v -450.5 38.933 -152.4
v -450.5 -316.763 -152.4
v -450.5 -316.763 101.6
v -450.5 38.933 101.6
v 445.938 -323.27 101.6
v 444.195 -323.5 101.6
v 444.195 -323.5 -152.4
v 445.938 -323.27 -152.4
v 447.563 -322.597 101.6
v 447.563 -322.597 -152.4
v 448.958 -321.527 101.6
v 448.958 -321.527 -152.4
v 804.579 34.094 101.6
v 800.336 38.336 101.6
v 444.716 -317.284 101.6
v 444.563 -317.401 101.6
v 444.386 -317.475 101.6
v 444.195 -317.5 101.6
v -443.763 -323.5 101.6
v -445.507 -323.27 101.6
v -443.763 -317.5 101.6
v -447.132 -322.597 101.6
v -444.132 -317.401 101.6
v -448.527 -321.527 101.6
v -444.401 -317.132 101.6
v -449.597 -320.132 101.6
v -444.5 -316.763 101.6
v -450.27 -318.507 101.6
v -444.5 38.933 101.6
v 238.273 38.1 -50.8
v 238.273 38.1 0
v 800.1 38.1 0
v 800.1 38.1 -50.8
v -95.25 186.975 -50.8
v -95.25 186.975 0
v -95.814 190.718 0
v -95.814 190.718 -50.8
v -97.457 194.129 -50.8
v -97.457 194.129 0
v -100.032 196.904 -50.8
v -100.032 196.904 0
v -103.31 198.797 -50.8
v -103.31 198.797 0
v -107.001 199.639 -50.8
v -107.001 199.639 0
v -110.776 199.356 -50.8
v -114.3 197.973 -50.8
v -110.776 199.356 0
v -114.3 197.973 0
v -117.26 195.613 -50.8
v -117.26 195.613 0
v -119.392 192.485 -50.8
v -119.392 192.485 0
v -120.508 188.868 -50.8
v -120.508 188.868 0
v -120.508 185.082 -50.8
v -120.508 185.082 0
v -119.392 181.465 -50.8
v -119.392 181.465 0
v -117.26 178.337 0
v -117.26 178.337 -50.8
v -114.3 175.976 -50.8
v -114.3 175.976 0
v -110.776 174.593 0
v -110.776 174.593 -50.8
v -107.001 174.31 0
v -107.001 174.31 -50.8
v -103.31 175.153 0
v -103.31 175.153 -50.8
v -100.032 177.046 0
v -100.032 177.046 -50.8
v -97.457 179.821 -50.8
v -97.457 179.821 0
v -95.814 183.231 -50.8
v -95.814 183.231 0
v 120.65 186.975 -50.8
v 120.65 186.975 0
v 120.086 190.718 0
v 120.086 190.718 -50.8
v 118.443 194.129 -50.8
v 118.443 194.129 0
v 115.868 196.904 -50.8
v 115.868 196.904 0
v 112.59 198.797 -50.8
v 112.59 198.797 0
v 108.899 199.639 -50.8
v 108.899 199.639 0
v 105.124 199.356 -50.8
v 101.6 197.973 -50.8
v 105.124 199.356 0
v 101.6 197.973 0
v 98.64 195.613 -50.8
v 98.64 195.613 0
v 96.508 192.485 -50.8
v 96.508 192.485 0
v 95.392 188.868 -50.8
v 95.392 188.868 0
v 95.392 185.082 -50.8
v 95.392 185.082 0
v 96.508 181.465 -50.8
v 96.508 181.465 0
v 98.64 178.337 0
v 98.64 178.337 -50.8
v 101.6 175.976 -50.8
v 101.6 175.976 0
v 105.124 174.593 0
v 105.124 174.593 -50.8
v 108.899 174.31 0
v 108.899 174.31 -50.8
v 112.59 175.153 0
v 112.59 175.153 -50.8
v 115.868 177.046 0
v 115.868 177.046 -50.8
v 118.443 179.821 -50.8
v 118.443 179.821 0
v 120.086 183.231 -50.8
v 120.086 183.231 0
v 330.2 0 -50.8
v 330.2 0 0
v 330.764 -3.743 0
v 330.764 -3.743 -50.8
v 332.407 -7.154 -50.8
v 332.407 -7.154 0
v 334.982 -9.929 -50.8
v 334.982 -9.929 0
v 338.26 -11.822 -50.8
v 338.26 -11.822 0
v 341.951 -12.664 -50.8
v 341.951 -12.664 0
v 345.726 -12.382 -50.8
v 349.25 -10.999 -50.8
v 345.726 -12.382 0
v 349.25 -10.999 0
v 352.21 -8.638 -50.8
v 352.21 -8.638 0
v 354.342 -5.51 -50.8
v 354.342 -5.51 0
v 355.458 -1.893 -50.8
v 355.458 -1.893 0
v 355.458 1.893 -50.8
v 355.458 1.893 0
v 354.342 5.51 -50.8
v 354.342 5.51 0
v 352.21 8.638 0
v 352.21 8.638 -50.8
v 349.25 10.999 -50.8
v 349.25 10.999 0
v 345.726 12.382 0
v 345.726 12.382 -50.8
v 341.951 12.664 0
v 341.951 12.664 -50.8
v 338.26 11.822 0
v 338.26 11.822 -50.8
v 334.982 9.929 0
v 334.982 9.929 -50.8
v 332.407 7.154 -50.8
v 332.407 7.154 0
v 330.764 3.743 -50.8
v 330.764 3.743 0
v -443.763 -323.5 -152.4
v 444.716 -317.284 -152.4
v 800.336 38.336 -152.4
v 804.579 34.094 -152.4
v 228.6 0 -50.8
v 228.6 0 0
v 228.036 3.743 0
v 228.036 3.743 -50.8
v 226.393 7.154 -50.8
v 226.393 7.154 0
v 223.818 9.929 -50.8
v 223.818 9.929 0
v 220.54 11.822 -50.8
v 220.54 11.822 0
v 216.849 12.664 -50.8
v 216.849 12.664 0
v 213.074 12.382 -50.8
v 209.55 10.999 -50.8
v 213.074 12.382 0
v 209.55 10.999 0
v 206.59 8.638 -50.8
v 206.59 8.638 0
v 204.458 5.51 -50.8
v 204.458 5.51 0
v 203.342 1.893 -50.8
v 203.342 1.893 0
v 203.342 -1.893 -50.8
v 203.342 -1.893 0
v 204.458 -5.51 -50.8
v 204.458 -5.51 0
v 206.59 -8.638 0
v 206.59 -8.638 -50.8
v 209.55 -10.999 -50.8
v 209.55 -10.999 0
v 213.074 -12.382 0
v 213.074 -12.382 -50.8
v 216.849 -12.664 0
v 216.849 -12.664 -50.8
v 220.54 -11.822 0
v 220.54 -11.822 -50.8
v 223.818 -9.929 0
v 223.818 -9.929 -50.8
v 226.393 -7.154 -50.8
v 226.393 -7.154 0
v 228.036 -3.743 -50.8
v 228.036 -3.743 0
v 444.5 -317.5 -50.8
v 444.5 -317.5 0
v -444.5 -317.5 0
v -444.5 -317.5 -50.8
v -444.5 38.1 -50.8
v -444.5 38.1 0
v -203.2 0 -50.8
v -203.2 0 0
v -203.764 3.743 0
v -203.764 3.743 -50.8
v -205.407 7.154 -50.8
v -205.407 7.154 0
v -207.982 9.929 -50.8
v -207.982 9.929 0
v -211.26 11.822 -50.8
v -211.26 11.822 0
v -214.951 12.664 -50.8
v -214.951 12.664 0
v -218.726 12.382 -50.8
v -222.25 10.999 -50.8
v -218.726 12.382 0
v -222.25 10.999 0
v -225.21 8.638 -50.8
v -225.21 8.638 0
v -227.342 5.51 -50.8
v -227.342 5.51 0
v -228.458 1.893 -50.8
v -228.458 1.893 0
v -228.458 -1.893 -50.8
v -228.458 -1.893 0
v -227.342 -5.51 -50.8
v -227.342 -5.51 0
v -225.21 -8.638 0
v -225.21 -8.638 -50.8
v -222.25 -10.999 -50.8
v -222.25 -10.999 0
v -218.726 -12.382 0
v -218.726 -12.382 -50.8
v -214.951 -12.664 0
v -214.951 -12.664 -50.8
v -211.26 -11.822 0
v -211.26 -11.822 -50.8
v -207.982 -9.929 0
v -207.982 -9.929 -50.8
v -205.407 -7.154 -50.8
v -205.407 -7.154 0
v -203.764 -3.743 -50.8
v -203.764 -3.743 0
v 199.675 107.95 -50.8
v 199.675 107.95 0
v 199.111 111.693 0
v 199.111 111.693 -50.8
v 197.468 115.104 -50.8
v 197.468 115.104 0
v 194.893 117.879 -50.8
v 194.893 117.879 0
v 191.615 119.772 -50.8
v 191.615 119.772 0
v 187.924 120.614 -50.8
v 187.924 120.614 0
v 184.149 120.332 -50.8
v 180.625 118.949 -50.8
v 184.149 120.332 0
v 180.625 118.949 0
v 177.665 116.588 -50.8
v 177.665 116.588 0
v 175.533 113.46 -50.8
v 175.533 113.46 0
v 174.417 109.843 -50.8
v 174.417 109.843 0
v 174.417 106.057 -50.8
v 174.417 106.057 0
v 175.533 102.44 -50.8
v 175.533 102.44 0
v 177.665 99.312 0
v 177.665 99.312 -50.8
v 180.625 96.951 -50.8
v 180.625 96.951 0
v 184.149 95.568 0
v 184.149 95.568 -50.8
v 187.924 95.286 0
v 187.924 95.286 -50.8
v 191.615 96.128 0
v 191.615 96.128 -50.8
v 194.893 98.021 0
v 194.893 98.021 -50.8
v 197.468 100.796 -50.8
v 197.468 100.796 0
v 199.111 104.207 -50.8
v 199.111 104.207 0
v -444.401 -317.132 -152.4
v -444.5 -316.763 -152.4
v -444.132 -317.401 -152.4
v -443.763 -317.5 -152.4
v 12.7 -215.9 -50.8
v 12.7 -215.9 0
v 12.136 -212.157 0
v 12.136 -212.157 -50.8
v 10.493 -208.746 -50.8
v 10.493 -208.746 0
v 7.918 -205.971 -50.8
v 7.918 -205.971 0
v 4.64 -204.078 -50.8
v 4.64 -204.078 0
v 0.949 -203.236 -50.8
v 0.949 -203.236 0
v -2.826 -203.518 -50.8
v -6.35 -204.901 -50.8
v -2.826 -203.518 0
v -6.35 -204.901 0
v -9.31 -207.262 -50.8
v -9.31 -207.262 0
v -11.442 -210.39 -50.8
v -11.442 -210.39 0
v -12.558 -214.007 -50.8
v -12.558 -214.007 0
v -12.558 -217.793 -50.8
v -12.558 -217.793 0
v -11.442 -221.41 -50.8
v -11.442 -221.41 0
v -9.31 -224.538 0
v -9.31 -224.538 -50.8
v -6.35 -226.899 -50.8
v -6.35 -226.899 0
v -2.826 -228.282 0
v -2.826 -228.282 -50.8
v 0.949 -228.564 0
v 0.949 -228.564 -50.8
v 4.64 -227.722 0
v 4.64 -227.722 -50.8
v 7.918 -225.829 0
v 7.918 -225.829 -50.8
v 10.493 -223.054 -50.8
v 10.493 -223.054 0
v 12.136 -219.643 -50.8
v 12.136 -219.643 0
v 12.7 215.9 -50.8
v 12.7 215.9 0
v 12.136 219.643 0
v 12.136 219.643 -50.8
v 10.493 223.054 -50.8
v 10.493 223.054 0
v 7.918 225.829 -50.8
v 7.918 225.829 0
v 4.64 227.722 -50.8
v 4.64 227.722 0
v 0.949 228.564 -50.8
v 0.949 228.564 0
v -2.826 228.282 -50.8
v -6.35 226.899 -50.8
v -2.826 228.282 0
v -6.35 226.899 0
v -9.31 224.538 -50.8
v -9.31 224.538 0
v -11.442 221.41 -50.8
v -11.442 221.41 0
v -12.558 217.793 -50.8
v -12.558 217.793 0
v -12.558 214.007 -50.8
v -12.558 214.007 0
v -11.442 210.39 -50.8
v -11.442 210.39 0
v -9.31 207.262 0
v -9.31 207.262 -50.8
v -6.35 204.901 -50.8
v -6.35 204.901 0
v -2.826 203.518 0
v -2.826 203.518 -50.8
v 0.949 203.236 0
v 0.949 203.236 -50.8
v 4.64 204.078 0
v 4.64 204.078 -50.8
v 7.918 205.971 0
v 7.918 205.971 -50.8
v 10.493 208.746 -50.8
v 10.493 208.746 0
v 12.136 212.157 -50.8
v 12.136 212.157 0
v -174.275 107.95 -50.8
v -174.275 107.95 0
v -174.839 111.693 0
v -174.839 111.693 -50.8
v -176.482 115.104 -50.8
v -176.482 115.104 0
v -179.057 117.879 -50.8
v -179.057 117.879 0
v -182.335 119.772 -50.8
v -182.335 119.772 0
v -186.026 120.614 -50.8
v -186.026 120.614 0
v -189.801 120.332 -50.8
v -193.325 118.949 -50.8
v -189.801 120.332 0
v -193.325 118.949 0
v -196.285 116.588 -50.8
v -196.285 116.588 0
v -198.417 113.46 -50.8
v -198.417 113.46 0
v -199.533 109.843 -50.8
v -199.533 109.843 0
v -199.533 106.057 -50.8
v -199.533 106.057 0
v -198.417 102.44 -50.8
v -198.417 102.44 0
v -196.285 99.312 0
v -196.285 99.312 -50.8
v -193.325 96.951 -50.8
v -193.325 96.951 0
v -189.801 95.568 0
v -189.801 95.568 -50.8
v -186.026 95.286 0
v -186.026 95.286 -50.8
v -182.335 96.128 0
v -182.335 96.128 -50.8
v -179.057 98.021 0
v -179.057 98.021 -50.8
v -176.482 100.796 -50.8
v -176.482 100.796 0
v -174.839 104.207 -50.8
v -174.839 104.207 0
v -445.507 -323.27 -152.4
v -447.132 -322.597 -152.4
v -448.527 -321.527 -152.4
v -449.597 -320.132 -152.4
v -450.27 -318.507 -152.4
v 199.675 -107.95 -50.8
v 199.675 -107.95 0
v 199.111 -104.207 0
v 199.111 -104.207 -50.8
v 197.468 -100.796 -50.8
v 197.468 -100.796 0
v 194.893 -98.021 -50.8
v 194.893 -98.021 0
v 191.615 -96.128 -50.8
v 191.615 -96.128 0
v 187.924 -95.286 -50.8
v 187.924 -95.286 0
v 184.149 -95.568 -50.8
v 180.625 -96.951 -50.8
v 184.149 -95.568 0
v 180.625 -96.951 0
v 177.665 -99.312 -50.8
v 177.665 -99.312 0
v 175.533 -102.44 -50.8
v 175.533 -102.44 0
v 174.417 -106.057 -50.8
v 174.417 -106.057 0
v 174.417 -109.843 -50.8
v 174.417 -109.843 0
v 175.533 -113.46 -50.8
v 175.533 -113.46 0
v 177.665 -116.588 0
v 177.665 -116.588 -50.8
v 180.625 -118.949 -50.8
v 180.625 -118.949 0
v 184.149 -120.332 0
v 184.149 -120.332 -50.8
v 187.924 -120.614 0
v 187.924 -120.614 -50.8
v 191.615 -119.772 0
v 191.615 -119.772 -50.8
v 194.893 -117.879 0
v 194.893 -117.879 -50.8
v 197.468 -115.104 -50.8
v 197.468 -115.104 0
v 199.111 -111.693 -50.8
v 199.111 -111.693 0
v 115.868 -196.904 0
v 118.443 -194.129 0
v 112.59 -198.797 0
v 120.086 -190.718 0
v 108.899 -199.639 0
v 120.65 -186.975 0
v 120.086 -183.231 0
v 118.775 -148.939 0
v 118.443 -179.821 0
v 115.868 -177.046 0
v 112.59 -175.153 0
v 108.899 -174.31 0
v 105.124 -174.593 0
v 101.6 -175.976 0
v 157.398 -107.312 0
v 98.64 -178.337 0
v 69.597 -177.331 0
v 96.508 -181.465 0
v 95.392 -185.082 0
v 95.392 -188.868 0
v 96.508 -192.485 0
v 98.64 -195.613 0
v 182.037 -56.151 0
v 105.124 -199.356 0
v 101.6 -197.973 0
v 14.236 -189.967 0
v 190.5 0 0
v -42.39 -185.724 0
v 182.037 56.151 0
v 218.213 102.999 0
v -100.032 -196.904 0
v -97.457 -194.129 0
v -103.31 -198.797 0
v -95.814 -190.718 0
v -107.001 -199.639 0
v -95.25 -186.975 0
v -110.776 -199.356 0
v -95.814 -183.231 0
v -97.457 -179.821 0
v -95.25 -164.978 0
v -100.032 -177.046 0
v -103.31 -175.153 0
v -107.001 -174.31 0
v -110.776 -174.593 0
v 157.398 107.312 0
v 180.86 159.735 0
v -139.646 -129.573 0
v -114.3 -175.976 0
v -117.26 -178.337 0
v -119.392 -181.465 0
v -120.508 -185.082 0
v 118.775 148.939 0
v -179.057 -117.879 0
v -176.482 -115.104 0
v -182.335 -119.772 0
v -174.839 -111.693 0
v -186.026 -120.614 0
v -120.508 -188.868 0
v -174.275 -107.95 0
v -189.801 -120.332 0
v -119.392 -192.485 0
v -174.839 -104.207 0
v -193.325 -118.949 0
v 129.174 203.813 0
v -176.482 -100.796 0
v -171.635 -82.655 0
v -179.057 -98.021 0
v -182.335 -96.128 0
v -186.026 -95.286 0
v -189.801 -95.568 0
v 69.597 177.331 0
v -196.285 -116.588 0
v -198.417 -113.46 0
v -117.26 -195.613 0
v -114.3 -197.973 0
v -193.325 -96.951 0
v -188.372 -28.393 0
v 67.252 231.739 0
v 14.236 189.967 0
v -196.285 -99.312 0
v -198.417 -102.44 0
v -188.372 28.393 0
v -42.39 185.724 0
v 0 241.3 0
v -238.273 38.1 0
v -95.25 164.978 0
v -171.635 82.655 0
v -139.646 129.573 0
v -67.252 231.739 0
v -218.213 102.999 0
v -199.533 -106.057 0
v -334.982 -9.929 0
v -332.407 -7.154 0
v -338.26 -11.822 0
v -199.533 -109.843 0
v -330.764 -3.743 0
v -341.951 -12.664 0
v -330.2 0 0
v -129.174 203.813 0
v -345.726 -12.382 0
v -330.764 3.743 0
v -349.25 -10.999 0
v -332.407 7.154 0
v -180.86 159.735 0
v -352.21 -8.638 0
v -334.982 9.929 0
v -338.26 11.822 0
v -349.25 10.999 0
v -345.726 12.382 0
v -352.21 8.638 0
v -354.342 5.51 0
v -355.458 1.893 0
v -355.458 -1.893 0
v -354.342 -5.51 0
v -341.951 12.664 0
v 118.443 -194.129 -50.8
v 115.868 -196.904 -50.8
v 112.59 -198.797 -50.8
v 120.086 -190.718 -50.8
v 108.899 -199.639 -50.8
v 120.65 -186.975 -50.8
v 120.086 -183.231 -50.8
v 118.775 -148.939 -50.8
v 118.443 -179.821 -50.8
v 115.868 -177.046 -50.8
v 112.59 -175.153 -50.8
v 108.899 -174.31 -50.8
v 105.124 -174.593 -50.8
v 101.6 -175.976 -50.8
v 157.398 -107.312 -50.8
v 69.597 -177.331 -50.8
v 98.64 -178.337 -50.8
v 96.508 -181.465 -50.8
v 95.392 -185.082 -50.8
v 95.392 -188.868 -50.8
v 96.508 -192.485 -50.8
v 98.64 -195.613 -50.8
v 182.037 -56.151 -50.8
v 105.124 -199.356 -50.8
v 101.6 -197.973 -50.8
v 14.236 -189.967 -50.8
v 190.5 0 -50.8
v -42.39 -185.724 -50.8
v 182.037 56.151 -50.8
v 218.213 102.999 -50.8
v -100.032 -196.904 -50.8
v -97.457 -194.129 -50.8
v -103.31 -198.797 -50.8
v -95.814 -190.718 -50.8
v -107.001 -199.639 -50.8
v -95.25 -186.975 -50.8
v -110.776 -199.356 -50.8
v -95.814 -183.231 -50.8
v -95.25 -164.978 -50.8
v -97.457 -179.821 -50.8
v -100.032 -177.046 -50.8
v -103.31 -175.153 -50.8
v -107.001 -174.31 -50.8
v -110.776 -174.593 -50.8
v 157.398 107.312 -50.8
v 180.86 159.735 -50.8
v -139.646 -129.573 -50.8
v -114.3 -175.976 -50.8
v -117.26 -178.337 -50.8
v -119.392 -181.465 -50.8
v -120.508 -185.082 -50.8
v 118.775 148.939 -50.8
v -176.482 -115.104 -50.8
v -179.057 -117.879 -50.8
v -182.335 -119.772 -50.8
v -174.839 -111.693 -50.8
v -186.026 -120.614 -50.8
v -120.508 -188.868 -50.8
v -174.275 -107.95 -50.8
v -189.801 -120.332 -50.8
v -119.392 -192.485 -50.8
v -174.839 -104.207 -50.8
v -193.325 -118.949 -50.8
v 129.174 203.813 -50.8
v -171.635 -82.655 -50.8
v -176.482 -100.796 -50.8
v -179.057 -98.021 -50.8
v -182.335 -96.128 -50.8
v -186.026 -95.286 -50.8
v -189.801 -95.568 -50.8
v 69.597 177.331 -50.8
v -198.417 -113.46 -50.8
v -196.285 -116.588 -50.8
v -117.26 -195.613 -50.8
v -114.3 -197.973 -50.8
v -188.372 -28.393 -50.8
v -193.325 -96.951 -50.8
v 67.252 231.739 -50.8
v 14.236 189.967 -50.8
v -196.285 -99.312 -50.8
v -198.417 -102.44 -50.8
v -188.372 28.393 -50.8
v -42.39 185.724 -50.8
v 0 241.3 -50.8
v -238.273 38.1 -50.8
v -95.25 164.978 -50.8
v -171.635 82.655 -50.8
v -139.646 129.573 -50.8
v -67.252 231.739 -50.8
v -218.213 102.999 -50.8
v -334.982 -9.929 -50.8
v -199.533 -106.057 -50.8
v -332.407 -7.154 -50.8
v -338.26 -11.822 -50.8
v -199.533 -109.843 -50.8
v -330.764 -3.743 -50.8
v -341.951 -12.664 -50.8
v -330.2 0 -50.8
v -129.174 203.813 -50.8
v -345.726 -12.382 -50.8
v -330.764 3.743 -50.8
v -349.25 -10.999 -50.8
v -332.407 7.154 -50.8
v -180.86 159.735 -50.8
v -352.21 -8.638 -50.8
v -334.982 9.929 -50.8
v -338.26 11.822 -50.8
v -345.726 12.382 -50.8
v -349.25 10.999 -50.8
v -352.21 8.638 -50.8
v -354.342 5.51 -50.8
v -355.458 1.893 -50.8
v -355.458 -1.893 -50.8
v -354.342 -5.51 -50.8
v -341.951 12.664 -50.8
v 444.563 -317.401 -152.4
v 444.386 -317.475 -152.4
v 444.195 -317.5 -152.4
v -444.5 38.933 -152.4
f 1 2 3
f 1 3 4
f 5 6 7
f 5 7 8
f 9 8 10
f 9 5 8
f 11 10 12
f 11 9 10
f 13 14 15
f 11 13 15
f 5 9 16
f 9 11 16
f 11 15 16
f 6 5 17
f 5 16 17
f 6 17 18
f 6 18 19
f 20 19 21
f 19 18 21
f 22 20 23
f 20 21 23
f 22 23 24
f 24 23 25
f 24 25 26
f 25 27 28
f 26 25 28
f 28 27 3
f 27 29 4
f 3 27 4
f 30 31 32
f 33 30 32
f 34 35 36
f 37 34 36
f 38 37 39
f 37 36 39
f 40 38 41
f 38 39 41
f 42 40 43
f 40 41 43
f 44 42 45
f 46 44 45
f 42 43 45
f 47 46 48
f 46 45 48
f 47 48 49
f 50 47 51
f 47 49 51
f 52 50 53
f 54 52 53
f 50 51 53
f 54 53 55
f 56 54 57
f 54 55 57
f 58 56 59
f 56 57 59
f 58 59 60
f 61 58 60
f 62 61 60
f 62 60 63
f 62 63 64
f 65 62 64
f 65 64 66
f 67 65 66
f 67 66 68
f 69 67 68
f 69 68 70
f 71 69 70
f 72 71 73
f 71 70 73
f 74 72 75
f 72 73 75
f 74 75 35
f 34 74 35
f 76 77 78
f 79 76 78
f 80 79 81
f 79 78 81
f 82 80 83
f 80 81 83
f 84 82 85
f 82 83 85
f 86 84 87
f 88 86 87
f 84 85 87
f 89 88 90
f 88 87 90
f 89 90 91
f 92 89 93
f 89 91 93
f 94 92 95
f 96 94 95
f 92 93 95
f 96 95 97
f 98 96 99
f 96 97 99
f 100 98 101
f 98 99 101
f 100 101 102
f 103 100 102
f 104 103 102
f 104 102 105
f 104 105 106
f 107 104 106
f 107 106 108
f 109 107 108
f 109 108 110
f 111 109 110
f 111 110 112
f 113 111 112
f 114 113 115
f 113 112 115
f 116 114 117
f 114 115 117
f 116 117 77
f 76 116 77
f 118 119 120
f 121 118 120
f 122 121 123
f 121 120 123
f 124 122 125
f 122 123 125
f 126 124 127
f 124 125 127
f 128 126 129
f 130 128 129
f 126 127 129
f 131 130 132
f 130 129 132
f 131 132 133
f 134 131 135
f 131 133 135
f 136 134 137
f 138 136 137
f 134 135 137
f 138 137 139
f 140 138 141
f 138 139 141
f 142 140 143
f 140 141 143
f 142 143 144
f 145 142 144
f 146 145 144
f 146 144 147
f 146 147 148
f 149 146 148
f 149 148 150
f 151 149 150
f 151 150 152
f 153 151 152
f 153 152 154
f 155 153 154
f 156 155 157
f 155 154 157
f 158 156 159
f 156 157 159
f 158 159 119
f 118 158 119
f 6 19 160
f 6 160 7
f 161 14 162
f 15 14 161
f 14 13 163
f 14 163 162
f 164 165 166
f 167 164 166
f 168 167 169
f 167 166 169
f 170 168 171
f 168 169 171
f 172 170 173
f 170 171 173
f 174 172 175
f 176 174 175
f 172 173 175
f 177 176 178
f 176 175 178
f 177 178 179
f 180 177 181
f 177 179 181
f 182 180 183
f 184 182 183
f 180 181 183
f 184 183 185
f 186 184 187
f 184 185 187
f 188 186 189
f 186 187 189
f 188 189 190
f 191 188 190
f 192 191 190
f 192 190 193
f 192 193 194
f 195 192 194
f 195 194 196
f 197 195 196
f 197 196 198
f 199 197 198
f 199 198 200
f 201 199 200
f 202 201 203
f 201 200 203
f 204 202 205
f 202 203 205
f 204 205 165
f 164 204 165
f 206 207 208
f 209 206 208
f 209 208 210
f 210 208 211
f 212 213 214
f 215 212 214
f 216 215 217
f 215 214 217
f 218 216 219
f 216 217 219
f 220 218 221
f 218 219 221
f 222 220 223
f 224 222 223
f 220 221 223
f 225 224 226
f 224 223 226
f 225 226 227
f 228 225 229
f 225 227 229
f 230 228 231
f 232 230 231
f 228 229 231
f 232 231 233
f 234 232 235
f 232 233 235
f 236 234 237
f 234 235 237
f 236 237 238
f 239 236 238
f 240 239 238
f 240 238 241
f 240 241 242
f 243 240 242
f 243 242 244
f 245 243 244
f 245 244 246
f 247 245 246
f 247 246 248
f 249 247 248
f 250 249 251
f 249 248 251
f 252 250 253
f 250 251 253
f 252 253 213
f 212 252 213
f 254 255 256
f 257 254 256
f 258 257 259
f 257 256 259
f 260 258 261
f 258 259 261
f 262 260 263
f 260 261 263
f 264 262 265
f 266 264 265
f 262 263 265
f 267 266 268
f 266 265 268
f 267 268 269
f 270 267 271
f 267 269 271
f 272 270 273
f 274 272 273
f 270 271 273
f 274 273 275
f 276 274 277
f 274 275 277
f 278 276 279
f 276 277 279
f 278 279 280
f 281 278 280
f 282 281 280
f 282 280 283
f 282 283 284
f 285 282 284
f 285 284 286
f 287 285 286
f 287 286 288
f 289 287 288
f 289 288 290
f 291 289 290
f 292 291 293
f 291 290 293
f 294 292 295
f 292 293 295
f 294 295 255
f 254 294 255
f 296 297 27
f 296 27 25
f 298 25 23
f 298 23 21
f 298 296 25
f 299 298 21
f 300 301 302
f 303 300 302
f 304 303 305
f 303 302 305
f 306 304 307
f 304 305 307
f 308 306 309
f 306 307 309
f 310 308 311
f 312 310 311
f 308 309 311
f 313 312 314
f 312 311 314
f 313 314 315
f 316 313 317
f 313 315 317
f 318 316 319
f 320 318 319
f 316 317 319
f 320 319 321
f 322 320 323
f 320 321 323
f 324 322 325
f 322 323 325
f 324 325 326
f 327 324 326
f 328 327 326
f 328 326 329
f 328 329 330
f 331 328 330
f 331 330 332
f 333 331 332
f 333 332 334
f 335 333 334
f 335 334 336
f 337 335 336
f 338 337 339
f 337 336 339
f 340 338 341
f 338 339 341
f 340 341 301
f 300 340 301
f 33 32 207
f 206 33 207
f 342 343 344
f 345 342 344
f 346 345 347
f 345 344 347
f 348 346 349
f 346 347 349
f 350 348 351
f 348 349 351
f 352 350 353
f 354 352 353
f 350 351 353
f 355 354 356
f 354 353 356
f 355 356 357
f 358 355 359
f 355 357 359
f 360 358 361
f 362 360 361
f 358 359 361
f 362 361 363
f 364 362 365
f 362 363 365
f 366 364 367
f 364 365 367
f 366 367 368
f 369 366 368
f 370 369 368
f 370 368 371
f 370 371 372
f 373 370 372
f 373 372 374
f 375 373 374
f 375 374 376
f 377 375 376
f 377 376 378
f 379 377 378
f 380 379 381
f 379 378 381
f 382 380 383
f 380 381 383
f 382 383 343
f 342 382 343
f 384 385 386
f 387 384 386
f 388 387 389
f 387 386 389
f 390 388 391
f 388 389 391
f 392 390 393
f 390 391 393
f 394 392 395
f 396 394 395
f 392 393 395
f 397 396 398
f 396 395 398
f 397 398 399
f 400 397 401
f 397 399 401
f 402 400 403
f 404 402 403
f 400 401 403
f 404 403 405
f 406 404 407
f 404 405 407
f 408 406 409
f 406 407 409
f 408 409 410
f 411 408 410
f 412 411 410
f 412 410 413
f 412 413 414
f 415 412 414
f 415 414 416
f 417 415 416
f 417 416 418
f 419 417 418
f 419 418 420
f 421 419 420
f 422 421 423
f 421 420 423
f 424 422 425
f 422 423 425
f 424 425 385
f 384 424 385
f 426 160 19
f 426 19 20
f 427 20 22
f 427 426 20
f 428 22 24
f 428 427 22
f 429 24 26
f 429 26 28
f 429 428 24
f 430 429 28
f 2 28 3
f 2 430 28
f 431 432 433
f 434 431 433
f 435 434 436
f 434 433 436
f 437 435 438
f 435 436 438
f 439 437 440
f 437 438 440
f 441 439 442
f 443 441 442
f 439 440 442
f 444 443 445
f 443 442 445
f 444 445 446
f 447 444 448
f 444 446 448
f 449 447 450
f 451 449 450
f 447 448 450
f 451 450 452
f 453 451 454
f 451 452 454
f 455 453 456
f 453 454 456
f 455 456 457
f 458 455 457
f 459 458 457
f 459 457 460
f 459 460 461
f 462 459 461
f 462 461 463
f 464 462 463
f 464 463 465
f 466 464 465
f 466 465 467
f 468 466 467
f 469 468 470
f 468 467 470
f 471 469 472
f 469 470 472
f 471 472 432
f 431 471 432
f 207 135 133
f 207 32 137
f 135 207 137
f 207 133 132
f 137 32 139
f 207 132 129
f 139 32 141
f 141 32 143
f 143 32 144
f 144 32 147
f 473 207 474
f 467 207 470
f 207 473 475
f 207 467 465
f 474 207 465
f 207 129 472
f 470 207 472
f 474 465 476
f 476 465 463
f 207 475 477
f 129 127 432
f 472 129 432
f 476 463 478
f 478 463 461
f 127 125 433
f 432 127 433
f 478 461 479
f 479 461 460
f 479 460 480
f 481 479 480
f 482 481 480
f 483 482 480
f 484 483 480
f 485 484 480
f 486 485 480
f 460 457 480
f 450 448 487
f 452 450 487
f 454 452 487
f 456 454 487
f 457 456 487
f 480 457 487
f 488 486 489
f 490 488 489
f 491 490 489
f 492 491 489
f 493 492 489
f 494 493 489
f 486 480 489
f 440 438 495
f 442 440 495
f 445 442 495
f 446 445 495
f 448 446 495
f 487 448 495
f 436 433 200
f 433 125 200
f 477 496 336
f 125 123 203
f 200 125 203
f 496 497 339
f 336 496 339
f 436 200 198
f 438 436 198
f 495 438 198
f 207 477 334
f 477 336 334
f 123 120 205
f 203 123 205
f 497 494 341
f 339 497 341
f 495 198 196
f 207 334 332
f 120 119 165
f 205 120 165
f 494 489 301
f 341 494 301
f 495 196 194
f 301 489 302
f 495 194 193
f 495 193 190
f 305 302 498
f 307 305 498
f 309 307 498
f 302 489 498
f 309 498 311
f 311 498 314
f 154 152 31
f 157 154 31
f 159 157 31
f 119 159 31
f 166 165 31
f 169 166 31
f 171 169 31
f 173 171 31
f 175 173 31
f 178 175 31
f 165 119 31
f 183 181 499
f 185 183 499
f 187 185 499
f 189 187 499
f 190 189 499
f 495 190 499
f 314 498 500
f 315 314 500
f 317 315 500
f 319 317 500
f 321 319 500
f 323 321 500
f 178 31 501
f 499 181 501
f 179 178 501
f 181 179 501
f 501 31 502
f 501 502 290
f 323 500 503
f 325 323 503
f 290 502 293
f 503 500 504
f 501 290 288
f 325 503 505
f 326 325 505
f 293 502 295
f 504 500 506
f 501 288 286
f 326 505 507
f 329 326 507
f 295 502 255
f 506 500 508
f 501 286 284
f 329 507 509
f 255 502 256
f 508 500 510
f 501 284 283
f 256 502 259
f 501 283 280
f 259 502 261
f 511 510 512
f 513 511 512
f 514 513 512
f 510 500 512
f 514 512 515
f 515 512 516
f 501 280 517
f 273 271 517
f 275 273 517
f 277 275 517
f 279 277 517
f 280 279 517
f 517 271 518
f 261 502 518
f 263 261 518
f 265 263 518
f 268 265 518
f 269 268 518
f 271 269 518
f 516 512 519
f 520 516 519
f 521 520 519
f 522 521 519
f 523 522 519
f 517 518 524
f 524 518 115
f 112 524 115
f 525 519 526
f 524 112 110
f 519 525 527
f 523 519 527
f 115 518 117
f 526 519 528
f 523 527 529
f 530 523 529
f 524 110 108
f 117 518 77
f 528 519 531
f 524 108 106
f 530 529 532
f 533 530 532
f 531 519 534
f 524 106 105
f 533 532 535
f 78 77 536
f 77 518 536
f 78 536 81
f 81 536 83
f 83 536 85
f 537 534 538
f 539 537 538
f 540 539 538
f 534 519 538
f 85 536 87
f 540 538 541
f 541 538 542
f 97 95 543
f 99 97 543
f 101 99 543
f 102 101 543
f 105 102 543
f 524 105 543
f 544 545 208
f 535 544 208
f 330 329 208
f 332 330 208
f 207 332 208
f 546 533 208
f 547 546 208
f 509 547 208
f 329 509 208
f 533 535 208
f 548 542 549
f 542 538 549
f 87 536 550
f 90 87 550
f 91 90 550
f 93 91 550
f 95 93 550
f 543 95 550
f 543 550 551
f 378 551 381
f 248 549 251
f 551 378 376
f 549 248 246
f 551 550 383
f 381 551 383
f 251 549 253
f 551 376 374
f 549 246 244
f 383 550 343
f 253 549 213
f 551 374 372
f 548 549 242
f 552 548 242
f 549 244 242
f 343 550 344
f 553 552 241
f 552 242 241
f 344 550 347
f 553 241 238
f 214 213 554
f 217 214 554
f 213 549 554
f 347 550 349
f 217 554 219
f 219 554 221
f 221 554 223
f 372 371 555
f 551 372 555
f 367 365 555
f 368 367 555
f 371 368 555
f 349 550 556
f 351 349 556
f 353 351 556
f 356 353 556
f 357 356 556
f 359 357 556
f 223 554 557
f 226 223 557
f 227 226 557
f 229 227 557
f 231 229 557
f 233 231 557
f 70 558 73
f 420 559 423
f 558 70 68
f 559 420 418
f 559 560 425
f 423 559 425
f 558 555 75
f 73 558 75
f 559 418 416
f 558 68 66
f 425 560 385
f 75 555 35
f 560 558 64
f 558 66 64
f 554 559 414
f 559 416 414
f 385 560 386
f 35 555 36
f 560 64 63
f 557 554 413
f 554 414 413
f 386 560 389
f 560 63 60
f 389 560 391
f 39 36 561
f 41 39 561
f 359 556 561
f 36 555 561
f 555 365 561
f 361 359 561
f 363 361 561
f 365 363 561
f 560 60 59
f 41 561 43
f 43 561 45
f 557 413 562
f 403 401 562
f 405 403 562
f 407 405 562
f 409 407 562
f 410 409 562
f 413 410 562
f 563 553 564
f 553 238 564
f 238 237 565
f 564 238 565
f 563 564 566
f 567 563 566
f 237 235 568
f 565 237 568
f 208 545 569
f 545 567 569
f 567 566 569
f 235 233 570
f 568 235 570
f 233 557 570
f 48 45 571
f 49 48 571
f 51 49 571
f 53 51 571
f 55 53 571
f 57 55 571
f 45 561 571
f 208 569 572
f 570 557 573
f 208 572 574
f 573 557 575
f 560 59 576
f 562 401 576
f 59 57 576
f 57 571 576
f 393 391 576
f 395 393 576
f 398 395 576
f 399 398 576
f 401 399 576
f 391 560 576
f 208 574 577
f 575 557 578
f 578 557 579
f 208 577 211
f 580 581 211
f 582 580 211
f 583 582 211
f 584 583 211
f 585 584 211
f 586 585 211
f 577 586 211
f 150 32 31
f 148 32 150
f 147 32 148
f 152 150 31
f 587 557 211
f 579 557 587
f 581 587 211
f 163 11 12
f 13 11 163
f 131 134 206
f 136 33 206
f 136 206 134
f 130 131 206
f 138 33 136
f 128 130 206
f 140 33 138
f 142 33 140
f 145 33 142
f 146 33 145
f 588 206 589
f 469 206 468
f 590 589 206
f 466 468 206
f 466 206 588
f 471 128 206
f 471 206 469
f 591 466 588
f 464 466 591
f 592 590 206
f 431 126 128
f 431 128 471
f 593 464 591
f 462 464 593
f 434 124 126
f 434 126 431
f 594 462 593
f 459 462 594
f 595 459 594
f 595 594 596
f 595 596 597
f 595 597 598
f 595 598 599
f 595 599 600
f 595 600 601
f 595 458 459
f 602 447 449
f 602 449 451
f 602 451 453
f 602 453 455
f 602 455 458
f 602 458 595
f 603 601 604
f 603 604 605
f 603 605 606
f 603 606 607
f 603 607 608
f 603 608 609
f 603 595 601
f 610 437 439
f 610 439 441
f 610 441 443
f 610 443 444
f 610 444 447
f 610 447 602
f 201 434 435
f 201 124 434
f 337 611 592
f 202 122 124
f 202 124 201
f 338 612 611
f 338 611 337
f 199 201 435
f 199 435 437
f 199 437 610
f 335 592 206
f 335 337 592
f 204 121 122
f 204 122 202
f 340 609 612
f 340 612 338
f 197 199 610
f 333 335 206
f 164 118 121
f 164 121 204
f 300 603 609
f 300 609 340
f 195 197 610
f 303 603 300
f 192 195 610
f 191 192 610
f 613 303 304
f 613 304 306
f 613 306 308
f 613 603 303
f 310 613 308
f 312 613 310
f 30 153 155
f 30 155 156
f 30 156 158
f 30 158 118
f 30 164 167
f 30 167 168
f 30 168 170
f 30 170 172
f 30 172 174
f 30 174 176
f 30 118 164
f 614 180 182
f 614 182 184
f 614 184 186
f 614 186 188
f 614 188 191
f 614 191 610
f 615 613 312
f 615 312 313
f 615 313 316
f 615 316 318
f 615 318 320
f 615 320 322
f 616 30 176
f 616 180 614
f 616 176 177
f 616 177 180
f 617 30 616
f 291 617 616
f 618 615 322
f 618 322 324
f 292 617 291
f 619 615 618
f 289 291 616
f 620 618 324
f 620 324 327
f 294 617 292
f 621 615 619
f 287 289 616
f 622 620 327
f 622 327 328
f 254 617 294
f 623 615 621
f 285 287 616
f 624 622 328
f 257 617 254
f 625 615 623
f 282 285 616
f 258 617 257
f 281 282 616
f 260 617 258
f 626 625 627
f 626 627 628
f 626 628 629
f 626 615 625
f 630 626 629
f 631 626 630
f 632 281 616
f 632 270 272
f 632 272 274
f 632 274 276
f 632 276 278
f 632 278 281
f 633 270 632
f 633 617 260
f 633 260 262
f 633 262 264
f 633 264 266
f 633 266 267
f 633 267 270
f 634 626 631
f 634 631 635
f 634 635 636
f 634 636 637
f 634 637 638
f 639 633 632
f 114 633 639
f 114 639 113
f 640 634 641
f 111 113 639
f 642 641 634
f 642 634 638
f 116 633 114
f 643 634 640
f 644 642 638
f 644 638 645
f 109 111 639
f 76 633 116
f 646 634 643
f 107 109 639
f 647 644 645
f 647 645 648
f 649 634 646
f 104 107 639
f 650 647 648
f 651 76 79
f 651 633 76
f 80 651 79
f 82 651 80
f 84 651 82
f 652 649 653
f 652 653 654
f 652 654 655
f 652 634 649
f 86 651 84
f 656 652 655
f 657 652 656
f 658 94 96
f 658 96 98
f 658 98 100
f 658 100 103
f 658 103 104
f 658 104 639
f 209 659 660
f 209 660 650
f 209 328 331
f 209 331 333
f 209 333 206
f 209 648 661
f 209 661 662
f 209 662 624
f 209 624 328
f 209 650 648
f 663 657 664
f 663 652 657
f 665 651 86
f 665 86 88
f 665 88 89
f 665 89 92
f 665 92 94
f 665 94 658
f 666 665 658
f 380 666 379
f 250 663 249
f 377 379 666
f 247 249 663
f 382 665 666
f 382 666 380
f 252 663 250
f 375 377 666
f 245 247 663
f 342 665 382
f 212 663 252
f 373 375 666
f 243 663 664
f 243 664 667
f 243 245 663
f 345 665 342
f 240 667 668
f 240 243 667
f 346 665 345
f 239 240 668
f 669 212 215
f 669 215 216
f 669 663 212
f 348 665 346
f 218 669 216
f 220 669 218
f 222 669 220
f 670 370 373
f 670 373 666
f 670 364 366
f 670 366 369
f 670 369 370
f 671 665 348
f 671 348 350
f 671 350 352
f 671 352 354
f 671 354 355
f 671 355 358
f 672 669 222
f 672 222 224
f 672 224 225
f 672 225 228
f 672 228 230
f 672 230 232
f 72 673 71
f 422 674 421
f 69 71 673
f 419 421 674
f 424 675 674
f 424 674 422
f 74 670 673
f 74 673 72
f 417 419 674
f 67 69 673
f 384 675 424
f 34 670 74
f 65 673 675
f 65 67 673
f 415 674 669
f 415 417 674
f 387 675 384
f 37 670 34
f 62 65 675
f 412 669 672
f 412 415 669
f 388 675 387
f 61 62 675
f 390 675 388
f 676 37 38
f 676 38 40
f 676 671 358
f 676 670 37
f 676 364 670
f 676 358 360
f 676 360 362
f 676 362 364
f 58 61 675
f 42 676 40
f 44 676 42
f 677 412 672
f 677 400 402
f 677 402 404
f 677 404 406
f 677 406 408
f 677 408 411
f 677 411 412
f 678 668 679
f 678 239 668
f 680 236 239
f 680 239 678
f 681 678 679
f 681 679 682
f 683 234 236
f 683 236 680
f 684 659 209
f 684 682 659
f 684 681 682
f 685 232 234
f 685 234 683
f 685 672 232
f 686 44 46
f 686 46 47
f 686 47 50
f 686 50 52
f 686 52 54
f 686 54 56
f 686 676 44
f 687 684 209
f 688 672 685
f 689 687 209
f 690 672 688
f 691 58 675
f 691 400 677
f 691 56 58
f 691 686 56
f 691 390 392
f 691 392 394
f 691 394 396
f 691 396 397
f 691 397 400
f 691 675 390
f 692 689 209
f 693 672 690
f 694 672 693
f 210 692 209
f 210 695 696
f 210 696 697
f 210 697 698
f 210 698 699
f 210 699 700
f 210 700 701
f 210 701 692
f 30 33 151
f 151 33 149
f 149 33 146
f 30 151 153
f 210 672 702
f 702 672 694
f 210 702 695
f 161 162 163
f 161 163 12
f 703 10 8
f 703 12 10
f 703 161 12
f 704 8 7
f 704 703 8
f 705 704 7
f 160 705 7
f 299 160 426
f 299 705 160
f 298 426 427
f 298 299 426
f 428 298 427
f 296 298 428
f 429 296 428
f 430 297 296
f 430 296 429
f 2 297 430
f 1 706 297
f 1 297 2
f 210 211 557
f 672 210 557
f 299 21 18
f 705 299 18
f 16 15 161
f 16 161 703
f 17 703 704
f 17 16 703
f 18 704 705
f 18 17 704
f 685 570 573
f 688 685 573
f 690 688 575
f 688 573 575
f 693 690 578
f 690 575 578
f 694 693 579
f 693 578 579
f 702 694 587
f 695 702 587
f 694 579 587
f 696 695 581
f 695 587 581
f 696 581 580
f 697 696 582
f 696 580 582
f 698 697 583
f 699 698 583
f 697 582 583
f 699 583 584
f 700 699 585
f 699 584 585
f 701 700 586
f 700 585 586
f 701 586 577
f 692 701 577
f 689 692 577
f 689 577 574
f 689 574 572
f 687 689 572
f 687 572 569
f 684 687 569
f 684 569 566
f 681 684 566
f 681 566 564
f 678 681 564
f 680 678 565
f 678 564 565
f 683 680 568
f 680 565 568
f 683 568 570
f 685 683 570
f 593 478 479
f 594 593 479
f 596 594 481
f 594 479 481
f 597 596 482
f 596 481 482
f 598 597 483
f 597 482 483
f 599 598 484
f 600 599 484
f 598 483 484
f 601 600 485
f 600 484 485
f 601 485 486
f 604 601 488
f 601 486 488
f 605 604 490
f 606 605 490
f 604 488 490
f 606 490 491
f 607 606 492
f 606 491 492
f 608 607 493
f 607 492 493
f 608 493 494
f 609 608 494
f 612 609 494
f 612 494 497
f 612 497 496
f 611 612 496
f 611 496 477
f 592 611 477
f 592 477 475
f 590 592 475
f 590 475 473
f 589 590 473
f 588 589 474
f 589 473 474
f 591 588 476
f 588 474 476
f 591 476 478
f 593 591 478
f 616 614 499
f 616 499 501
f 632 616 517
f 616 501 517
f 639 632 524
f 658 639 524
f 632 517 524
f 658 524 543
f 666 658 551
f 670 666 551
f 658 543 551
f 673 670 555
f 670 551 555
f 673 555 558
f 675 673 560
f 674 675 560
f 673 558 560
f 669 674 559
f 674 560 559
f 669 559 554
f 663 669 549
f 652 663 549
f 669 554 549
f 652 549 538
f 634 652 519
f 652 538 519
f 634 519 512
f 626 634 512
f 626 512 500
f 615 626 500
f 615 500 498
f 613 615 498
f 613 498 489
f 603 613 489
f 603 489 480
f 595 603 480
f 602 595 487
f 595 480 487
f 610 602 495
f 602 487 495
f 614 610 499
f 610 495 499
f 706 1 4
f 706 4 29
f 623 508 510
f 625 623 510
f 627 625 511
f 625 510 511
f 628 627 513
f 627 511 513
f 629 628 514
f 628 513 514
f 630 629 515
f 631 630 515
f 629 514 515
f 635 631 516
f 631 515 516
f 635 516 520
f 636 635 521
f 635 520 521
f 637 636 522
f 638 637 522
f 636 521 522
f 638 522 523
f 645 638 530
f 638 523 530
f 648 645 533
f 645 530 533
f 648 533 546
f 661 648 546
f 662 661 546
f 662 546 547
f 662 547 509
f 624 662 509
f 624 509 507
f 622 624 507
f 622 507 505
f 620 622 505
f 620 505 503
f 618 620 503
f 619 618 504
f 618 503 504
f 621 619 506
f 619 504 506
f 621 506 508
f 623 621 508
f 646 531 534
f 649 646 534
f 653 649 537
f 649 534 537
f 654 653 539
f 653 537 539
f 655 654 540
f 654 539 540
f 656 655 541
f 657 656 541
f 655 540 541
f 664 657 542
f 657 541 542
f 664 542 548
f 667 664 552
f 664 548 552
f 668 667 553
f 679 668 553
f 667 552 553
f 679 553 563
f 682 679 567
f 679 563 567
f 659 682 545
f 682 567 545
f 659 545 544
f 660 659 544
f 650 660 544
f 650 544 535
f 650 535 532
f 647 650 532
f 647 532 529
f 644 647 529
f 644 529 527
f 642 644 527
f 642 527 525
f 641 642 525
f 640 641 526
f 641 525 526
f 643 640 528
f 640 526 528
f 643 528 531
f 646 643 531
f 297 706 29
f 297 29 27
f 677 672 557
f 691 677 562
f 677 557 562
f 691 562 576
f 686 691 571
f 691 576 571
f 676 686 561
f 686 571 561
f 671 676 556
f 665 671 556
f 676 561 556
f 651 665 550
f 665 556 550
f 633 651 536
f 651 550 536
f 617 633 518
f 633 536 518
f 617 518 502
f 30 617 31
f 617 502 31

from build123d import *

# Parameters (mm, degrees)
SKETCH1_R                    = 190.5
SKETCH1_R_2                  = 12.7
BASE_FLANGE1_DEPTH           = 50.8
SKETCH26_W                   = 889
SKETCH26_H                   = 254
BASE_FLANGE2_DEPTH           = 6
EDGE_FLANGE1_STRIP_CUT_DEPTH = 254
EDGE_FLANGE1_DEPTH           = 254
EDGE_FLANGE2_STRIP_W         = 25.4732
EDGE_FLANGE2_STRIP_H         = 6
EDGE_FLANGE2_STRIP_CUT_DEPTH = 254
EDGE_FLANGE2_DEPTH           = 254


# Sheet-metal steps are written as plain solids
with BuildPart() as part:
    # Sketch1 → Base-Flange1 (new body)
    with BuildSketch(Plane.XY):
        with BuildLine():
            Line((-342.9, 38.1), (-238.273120599, 38.1))
            ThreePointArc((-238.273120599, 38.1), (0, 241.3), (238.273120599, 38.1))
            Line((238.273120599, 38.1), (342.9, 38.1))
            Line((342.9, 38.1), (800.1, 38.1))
            Line((800.1, 38.1), (444.5, -317.5))
            Line((444.5, -317.5), (-444.5, -317.5))
            Line((-444.5, -317.5), (-444.5, 38.1))
            Line((-444.5, 38.1), (-342.9, 38.1))
        make_face()
        Circle(SKETCH1_R, mode=Mode.SUBTRACT)
        with Locations((0, 215.9)):
            Circle(SKETCH1_R_2, mode=Mode.SUBTRACT)
        with Locations((107.95, 186.974884677)):
            Circle(SKETCH1_R_2, mode=Mode.SUBTRACT)
        with Locations((186.974884677, 107.95)):
            Circle(SKETCH1_R_2, mode=Mode.SUBTRACT)
        with Locations((215.9, 0)):
            Circle(SKETCH1_R_2, mode=Mode.SUBTRACT)
        with Locations((186.974884677, -107.95)):
            Circle(SKETCH1_R_2, mode=Mode.SUBTRACT)
        with Locations((107.95, -186.974884677)):
            Circle(SKETCH1_R_2, mode=Mode.SUBTRACT)
        with Locations((0, -215.9)):
            Circle(SKETCH1_R_2, mode=Mode.SUBTRACT)
        with Locations((-107.95, -186.974884677)):
            Circle(SKETCH1_R_2, mode=Mode.SUBTRACT)
        with Locations((-186.974884677, -107.95)):
            Circle(SKETCH1_R_2, mode=Mode.SUBTRACT)
        with Locations((-215.9, 0)):
            Circle(SKETCH1_R_2, mode=Mode.SUBTRACT)
        with Locations((-186.974884677, 107.95)):
            Circle(SKETCH1_R_2, mode=Mode.SUBTRACT)
        with Locations((-107.95, 186.974884677)):
            Circle(SKETCH1_R_2, mode=Mode.SUBTRACT)
        with Locations((-342.9, 0)):
            Circle(SKETCH1_R_2, mode=Mode.SUBTRACT)
        with Locations(Location((342.9, 0, 0), (0, 0, 180))):
            Circle(SKETCH1_R_2, mode=Mode.SUBTRACT)
    extrude(amount=-BASE_FLANGE1_DEPTH)


with BuildPart() as body_2:
    # Sketch26 → Base-Flange2 (new body)
    with BuildSketch(Plane.XZ.offset(317.5)):
        with Locations((0, -25.4)):
            Rectangle(SKETCH26_W, SKETCH26_H)
    extrude(amount=BASE_FLANGE2_DEPTH)

    # Edge-Flange1 strip (across the edge) → Edge-Flange1 strip cut (cut)
    with BuildSketch(Plane(origin=(444.5, -317.5, 101.6), x_dir=(-0.7071067811865438, 0.7071067811865512, 0), z_dir=(0, 0, -1))):
        Polygon((-22.039168001, 13.553886626), (-4.026895542, -4.458385832), (0.215745145, -0.215745145), (-17.796527314, 17.796527314), align=None)
    extrude(amount=EDGE_FLANGE1_STRIP_CUT_DEPTH, mode=Mode.SUBTRACT)

    # Edge-Flange1 section (across the edge) → Edge-Flange1 (add)
    with BuildSketch(Plane(origin=(444.5, -317.5, 101.6), x_dir=(-0.7071067811865438, 0.7071067811865512, 0), z_dir=(0, 0, -1))):
        with BuildLine():
            Line((-6, 0.30510971), (-6, 503.228718626))
            Line((-6, 503.228718626), (0, 503.228718626))
            Line((0, 503.228718626), (0, 0.30510971))
            ThreePointArc((0, 0.30510971), (0.056070336, 0.023225094), (0.215745145, -0.215745145))
            Line((0.215745145, -0.215745145), (-4.026895542, -4.458385832))
            ThreePointArc((-4.026895542, -4.458385832), (-5.487206859, -2.2728755), (-6, 0.30510971))
        make_face()
    extrude(amount=EDGE_FLANGE1_DEPTH)

    # Edge-Flange2 strip (across the edge) → Edge-Flange2 strip cut (cut)
    with BuildSketch(Plane(origin=(-444.5, -317.5, -152.4), x_dir=(1, 0, 0), z_dir=(0, 0, 1))):
        with Locations((-12, -3)):
            Rectangle(EDGE_FLANGE2_STRIP_W, EDGE_FLANGE2_STRIP_H)
    extrude(amount=EDGE_FLANGE2_STRIP_CUT_DEPTH, mode=Mode.SUBTRACT)

    # Edge-Flange2 section (across the edge) → Edge-Flange2 (add)
    with BuildSketch(Plane(origin=(-444.5, -317.5, -152.4), x_dir=(1, 0, 0), z_dir=(0, 0, 1))):
        with BuildLine():
            Line((-6, 0.7366), (-6, 356.4326))
            Line((-6, 356.4326), (0, 356.4326))
            Line((0, 356.4326), (0, 0.7366))
            ThreePointArc((0, 0.7366), (0.215745145, 0.215745145), (0.7366, 0))
            Line((0.7366, 0), (0.7366, -6))
            ThreePointArc((0.7366, -6), (-4.026895542, -4.026895542), (-6, 0.7366))
        make_face()
    extrude(amount=EDGE_FLANGE2_DEPTH)


solid = Compound([part.part, body_2.part])
